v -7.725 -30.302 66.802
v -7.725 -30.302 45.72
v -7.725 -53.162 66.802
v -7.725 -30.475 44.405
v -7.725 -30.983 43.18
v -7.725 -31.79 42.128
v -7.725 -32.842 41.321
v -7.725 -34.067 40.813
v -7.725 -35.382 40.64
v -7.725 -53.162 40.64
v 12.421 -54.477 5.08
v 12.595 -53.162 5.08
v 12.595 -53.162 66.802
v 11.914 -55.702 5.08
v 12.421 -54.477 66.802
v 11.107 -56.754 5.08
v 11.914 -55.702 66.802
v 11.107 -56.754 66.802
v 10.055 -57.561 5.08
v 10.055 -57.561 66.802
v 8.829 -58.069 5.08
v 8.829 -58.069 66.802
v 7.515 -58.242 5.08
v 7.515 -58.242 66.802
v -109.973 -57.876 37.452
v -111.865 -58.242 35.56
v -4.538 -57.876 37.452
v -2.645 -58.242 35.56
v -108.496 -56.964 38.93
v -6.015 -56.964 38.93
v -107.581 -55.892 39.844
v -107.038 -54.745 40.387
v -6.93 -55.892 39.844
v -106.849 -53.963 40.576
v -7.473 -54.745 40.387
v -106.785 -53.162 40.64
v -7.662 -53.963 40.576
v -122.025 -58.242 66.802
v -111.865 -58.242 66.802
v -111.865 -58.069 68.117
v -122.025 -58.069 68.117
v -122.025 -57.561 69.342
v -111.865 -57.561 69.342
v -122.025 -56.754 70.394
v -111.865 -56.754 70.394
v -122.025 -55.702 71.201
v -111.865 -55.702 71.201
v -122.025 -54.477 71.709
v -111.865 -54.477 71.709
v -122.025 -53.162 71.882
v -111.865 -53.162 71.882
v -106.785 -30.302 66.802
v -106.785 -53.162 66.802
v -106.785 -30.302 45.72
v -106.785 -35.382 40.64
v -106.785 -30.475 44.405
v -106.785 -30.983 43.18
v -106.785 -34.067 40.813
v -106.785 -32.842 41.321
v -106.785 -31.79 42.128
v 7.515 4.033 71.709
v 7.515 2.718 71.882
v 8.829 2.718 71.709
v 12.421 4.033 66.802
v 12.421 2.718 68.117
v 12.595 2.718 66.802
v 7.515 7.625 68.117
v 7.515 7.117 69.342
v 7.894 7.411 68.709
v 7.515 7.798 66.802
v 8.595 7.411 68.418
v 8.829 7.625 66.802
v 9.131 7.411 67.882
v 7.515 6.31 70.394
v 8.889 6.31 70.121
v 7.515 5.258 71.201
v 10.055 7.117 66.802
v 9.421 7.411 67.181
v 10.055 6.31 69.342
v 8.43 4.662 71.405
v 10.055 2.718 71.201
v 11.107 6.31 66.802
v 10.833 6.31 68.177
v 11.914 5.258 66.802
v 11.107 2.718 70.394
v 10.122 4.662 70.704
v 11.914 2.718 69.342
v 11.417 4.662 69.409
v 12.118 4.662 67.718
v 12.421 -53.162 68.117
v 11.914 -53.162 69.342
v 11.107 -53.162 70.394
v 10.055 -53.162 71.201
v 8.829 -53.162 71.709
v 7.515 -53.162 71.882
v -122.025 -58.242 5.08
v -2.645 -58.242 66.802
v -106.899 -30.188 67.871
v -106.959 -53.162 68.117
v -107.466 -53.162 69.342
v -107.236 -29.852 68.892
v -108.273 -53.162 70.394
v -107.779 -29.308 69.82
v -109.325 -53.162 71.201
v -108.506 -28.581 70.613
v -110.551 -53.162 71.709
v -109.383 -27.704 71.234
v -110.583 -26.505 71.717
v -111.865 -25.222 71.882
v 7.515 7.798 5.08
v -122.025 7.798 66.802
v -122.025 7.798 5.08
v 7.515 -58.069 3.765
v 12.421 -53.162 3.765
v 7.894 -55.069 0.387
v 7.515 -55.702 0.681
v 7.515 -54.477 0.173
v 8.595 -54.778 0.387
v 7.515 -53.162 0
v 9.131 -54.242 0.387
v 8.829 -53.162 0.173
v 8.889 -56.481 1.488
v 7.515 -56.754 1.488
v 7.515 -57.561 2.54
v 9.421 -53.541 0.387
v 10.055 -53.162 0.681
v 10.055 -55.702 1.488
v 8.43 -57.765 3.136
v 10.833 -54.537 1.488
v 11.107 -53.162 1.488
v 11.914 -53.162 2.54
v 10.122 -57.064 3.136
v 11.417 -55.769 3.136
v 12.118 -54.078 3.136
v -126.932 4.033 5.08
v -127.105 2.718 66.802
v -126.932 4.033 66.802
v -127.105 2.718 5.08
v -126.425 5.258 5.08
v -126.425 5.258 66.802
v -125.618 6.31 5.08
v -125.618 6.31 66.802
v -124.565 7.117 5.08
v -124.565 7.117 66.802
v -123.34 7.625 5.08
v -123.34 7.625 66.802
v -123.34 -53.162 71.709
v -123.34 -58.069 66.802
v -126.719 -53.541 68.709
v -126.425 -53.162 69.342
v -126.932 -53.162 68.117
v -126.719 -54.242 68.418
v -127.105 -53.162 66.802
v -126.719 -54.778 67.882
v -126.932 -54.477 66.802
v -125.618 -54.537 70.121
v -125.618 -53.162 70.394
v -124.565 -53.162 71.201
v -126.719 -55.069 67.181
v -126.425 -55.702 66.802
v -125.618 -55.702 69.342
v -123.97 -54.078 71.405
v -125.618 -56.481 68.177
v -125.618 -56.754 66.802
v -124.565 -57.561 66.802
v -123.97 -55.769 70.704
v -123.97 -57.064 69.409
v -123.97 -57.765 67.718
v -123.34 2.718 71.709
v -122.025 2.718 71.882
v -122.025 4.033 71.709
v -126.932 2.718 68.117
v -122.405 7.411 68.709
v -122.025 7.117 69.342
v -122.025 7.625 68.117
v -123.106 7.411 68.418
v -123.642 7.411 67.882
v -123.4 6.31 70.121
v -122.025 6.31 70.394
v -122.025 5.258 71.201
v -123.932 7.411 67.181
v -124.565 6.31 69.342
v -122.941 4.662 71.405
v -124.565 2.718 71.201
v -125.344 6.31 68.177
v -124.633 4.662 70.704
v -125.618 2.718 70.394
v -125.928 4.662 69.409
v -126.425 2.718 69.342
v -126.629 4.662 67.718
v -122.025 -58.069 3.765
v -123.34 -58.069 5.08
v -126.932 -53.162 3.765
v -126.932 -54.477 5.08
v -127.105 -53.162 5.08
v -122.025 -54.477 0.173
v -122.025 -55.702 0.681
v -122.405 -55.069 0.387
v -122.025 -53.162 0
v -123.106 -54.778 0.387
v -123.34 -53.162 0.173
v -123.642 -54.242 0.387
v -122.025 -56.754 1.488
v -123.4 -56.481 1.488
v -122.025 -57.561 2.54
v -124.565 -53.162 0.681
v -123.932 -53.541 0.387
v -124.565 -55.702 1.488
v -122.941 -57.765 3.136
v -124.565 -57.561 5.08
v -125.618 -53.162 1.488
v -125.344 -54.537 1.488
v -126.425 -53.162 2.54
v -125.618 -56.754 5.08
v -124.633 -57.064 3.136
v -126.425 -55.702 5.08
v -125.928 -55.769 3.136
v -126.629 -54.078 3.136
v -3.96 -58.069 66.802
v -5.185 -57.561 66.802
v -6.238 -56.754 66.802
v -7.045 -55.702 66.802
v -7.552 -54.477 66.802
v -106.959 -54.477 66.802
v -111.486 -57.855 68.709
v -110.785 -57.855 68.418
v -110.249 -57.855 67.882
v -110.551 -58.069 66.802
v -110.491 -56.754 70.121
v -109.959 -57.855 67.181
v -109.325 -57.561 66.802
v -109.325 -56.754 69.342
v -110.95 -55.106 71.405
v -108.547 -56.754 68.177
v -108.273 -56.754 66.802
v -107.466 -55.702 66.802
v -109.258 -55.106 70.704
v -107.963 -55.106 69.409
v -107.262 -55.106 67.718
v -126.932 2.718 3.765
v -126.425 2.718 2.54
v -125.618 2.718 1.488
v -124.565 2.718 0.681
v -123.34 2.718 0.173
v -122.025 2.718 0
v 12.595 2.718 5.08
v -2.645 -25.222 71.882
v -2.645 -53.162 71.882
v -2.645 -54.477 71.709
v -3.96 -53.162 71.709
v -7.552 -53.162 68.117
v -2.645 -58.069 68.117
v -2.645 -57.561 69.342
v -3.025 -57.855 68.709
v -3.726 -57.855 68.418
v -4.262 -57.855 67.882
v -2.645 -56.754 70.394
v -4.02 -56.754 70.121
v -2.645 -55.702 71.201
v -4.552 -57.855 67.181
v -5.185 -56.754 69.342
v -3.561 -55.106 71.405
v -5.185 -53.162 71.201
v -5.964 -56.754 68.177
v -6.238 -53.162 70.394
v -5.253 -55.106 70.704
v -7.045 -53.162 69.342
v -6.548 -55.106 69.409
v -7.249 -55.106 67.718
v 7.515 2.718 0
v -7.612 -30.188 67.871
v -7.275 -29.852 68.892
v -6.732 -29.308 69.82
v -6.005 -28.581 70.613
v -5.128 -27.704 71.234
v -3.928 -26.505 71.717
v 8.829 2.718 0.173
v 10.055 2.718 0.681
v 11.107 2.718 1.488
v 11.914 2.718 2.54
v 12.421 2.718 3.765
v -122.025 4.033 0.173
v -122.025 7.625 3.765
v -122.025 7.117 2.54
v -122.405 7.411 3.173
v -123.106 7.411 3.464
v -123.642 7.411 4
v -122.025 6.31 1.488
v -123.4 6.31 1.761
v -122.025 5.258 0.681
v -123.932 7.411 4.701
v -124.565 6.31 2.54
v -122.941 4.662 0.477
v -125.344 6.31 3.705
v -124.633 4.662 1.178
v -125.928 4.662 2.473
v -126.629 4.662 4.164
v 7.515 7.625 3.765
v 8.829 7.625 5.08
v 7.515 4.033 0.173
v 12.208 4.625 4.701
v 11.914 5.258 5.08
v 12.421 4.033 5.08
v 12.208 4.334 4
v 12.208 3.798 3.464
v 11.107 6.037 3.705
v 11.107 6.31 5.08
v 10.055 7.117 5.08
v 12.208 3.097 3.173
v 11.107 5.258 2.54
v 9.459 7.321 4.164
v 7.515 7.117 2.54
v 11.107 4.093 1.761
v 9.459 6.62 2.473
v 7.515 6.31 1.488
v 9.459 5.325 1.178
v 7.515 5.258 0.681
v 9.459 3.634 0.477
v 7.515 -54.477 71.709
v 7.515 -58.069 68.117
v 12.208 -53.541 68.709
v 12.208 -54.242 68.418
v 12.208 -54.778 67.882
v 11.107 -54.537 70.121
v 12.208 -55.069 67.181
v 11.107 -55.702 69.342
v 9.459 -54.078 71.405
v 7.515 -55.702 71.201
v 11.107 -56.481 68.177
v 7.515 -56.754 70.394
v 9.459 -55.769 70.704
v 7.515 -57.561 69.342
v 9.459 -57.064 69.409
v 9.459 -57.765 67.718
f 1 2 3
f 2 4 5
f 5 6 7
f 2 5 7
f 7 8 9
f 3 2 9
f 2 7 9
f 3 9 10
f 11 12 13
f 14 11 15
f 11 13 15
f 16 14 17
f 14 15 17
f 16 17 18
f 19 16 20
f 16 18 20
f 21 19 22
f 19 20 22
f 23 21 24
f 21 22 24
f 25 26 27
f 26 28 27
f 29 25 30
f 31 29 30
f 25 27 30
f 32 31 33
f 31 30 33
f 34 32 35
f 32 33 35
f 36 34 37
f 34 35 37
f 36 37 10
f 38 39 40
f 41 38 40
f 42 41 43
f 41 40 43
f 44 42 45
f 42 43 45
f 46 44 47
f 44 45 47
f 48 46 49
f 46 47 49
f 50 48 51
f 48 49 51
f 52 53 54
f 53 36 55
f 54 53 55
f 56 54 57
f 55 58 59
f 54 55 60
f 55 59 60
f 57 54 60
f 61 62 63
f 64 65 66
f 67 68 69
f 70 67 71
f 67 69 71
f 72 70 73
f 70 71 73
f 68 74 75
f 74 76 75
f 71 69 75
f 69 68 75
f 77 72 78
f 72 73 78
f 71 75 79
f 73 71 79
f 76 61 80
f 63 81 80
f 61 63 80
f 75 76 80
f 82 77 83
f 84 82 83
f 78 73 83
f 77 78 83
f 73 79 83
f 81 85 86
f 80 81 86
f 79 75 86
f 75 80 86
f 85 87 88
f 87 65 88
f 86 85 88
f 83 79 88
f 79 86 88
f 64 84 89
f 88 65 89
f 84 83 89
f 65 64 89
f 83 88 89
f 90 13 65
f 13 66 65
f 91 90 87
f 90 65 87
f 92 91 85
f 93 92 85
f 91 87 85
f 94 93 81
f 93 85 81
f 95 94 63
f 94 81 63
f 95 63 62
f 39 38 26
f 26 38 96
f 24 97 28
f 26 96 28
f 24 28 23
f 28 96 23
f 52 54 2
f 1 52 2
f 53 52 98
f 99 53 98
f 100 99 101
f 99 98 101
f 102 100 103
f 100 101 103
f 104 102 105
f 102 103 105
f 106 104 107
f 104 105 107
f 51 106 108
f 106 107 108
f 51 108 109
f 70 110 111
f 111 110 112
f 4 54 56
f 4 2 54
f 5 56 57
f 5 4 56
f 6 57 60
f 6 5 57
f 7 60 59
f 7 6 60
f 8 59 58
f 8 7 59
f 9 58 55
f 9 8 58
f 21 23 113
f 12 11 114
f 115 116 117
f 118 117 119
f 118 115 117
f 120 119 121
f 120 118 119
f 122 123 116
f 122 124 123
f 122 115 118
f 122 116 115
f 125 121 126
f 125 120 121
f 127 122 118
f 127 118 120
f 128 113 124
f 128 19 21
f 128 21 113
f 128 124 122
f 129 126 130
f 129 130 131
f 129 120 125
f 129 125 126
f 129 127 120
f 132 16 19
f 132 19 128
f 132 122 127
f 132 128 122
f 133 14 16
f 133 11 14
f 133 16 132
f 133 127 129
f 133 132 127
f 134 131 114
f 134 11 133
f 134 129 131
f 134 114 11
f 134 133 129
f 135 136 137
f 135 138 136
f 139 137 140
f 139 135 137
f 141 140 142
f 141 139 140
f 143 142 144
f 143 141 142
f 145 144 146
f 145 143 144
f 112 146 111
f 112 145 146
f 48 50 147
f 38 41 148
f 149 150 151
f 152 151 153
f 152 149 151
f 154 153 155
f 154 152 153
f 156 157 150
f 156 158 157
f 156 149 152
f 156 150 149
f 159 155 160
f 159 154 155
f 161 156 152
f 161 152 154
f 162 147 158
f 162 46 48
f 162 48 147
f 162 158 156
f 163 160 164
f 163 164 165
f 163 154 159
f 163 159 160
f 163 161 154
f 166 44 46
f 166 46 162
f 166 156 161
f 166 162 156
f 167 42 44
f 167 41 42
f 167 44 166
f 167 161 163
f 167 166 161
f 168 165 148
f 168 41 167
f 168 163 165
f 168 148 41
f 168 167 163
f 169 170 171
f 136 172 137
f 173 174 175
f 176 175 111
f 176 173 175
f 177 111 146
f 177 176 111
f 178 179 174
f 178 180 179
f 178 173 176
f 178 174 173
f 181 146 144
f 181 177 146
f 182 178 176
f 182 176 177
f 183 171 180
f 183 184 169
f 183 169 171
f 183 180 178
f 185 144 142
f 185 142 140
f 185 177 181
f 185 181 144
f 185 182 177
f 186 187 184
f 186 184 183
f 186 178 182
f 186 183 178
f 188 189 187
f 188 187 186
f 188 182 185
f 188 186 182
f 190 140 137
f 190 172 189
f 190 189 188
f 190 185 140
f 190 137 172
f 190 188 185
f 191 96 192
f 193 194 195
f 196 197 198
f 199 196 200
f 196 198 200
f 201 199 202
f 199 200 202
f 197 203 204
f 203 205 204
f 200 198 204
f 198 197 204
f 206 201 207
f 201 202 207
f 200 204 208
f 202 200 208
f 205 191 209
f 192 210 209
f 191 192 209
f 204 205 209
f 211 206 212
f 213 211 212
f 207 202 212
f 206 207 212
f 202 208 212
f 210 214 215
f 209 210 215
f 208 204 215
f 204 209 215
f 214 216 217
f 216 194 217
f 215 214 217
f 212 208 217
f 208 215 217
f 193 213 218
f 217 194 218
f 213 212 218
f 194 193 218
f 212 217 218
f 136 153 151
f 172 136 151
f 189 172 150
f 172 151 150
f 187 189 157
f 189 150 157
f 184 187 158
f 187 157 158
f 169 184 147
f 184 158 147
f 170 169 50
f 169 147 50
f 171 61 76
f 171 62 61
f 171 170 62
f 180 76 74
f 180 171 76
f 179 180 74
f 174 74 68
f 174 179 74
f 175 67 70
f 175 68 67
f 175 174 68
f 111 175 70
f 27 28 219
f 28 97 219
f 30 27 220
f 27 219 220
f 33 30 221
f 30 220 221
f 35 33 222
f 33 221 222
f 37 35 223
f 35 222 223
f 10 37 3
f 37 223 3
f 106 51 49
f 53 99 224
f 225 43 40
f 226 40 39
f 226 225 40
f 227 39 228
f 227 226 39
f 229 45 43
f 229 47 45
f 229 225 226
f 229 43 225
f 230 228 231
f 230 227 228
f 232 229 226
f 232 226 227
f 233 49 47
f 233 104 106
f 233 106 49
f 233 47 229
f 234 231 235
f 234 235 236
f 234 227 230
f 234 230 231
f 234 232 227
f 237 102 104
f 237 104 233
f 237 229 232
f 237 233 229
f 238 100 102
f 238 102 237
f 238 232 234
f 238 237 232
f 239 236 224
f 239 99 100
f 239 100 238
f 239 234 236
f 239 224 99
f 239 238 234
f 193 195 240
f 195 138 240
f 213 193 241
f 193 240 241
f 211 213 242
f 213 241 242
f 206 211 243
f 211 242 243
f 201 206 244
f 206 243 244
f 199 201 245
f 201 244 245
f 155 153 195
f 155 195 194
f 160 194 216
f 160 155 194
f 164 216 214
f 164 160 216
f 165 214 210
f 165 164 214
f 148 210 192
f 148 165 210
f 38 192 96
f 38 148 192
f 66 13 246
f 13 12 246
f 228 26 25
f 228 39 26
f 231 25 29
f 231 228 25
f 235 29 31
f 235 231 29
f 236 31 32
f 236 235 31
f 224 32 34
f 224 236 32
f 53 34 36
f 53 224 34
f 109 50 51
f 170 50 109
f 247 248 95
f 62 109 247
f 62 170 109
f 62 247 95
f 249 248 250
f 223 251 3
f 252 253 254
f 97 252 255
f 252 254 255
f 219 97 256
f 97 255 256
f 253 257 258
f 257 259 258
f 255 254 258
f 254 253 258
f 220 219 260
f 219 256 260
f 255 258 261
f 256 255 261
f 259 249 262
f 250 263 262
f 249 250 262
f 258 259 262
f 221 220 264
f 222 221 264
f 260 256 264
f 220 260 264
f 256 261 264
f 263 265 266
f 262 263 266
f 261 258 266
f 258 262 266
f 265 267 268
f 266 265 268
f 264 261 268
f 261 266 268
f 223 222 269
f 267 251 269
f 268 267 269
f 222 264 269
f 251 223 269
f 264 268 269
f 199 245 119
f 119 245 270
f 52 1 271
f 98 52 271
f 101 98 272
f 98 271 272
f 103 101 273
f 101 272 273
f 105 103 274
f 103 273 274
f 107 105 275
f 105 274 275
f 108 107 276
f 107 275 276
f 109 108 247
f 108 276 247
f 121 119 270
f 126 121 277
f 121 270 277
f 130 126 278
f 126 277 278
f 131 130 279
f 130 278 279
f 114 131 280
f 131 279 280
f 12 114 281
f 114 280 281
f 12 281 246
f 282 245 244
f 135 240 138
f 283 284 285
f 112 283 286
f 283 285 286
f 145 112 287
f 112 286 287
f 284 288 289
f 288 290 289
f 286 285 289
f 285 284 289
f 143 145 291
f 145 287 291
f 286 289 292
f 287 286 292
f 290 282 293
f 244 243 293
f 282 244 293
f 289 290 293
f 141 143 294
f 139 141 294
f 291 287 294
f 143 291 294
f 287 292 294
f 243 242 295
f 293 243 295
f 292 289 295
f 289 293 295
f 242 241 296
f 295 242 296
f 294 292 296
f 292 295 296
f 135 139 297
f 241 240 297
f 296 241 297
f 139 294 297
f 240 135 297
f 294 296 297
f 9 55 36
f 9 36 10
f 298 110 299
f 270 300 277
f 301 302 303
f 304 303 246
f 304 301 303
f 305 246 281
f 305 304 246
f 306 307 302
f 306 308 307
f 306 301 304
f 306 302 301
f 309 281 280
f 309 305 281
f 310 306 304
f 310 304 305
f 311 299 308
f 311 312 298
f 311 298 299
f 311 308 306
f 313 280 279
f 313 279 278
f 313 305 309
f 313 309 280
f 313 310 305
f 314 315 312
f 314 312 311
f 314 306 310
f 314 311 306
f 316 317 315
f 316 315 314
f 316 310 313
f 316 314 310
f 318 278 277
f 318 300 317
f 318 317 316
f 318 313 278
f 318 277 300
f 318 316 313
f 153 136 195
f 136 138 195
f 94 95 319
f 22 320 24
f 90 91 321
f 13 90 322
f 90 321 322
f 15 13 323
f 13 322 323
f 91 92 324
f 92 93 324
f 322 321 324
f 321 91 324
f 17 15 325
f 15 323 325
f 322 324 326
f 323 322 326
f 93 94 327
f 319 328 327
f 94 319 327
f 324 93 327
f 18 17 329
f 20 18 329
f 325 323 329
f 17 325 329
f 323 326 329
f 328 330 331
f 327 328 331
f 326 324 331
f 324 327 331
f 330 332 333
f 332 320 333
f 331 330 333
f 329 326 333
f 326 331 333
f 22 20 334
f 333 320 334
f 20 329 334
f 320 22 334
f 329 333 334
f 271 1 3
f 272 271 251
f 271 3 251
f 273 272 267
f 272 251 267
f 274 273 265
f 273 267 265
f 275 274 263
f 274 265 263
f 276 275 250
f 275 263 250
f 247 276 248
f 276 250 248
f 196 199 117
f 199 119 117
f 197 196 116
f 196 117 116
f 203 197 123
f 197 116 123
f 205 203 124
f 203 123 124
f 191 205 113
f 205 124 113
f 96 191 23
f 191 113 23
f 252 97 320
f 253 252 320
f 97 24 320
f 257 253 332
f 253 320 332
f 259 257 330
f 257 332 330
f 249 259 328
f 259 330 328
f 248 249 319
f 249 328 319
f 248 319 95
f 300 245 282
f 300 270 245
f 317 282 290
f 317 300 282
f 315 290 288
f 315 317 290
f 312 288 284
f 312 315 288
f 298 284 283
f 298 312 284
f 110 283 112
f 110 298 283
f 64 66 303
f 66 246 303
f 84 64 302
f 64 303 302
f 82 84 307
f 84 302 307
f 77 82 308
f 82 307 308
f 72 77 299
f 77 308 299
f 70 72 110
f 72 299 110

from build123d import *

# Parameters (mm, degrees)
F0_W     = 139.7
F0_H     = 66.04
F1_DEPTH = 40.64
F2_W     = 99.06
F2_H     = 38.1
F3_DEPTH = 31.242
F4_R     = 5.08


with BuildPart() as f1:
    # F0 (on Top) → F1 (new body)
    with BuildSketch(Plane.XY):
        with Locations((-57.2554800045, -25.2220156343)):
            Rectangle(F0_W, F0_H)
    extrude(amount=F1_DEPTH)

    # F2 (on face) → F3 (join)
    with BuildSketch(Plane.XY.offset(40.64)):
        Polygon((-106.7854800045, 7.7979843657), (-127.1054800045, 7.7979843657), (-127.1054800045, -58.2420156343), (-106.7854800045, -58.2420156343), (-106.7854800045, -30.3020156343), align=None)
        Polygon((12.5945199955, 7.7979843657), (-7.7254800045, 7.7979843657), (-7.7254800045, -30.3020156343), (-7.7254800045, -58.2420156343), (12.5945199955, -58.2420156343), align=None)
        with Locations((-57.2554800045, -11.2520156343)):
            Rectangle(F2_W, F2_H)
    extrude(amount=F3_DEPTH)

    # F4
    f4_edges = [f1.edges().sort_by_distance(p)[0] for p in [
        (-57.25548, -30.302016, 71.882),
        (-7.72548, -44.272016, 71.882),
        (-106.78548, -44.272016, 71.882),
        (2.43452, -58.242016, 71.882),
        (12.59452, -25.222016, 71.882),
        (-116.94548, -58.242016, 71.882),
        (-127.10548, -25.222016, 71.882),
        (-57.25548, 7.797984, 71.882),
        (12.59452, -58.242016, 35.941),
        (-7.72548, -58.242016, 56.261),
        (-57.25548, -58.242016, 40.64),
        (-57.25548, -30.302016, 40.64),
        (-106.78548, -58.242016, 56.261),
        (-127.10548, -58.242016, 35.941),
        (-57.25548, -58.242016, 0),
        (-127.10548, -25.222016, 0),
        (-57.25548, 7.797984, 0),
        (-127.10548, 7.797984, 35.941),
        (12.59452, 7.797984, 35.941),
        (12.59452, -25.222016, 0),
    ]]
    fillet(f4_edges, radius=F4_R)


solid = f1.part
